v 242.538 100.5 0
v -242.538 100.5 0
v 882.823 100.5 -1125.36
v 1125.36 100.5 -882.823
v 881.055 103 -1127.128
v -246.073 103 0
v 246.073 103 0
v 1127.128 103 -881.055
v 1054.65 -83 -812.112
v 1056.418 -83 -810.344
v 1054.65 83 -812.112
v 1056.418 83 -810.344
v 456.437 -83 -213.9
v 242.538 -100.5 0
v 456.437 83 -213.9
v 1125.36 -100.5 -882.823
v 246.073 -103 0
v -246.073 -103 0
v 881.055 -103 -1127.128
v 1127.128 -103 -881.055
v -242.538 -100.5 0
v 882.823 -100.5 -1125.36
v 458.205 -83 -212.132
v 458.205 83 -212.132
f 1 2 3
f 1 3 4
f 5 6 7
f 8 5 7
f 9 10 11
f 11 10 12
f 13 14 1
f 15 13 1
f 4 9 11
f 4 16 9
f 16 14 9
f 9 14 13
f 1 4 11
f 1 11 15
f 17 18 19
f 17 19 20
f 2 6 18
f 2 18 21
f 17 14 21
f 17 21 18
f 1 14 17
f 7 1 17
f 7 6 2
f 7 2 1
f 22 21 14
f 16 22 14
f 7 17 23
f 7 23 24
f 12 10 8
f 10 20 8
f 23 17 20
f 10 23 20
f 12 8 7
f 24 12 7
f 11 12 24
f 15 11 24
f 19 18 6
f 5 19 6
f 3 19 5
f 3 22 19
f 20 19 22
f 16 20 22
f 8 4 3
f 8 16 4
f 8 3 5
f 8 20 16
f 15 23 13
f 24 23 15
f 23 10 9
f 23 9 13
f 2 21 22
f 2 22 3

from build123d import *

# Parameters (mm, degrees)
F4_W      = 206
F4_H      = 348
F5_DEPTH  = 1800
F6_T      = -2.5
F7_W      = 1062.3749792576
F7_H      = 600.0114679337
F8_DEPTH  = 391.7381567773
F9_W      = 166
F9_H      = 846
F10_DEPTH = 12.5


with BuildPart() as f5:
    # F4 (on face) → F5 (new body)
    with BuildSketch(Plane(origin=(1004.0916292849, 0, -1004.0916292849), x_dir=(0, 1, 0), z_dir=(0.7071067812, 0, -0.7071067812))):
        Rectangle(F4_W, F4_H)
    extrude(amount=-F5_DEPTH)

    # F6
    f6_openings = [f5.faces().sort_by_distance(p)[0] for p in [
        (1004.091629, 0, -1004.091629),
    ]]
    offset(amount=F6_T, openings=f6_openings)

    # F7 (on Top) → F8 (cut, through all)
    with BuildSketch(Plane.XY):
        with Locations((39.5732372999, -20.192950964)):
            Rectangle(F7_W, F7_H)
    extrude(amount=F8_DEPTH, mode=Mode.SUBTRACT)

    # F9 (on face) → F10 (cut, symmetric)
    with BuildSketch(Plane(origin=(123.0365799265, 0, 123.0365799265), x_dir=(0, 1, 0), z_dir=(0.7071067812, 0, 0.7071067812))):
        with Locations((0, -897)):
            Rectangle(F9_W, F9_H)
    extrude(amount=F10_DEPTH, both=True, mode=Mode.SUBTRACT)


solid = f5.part
